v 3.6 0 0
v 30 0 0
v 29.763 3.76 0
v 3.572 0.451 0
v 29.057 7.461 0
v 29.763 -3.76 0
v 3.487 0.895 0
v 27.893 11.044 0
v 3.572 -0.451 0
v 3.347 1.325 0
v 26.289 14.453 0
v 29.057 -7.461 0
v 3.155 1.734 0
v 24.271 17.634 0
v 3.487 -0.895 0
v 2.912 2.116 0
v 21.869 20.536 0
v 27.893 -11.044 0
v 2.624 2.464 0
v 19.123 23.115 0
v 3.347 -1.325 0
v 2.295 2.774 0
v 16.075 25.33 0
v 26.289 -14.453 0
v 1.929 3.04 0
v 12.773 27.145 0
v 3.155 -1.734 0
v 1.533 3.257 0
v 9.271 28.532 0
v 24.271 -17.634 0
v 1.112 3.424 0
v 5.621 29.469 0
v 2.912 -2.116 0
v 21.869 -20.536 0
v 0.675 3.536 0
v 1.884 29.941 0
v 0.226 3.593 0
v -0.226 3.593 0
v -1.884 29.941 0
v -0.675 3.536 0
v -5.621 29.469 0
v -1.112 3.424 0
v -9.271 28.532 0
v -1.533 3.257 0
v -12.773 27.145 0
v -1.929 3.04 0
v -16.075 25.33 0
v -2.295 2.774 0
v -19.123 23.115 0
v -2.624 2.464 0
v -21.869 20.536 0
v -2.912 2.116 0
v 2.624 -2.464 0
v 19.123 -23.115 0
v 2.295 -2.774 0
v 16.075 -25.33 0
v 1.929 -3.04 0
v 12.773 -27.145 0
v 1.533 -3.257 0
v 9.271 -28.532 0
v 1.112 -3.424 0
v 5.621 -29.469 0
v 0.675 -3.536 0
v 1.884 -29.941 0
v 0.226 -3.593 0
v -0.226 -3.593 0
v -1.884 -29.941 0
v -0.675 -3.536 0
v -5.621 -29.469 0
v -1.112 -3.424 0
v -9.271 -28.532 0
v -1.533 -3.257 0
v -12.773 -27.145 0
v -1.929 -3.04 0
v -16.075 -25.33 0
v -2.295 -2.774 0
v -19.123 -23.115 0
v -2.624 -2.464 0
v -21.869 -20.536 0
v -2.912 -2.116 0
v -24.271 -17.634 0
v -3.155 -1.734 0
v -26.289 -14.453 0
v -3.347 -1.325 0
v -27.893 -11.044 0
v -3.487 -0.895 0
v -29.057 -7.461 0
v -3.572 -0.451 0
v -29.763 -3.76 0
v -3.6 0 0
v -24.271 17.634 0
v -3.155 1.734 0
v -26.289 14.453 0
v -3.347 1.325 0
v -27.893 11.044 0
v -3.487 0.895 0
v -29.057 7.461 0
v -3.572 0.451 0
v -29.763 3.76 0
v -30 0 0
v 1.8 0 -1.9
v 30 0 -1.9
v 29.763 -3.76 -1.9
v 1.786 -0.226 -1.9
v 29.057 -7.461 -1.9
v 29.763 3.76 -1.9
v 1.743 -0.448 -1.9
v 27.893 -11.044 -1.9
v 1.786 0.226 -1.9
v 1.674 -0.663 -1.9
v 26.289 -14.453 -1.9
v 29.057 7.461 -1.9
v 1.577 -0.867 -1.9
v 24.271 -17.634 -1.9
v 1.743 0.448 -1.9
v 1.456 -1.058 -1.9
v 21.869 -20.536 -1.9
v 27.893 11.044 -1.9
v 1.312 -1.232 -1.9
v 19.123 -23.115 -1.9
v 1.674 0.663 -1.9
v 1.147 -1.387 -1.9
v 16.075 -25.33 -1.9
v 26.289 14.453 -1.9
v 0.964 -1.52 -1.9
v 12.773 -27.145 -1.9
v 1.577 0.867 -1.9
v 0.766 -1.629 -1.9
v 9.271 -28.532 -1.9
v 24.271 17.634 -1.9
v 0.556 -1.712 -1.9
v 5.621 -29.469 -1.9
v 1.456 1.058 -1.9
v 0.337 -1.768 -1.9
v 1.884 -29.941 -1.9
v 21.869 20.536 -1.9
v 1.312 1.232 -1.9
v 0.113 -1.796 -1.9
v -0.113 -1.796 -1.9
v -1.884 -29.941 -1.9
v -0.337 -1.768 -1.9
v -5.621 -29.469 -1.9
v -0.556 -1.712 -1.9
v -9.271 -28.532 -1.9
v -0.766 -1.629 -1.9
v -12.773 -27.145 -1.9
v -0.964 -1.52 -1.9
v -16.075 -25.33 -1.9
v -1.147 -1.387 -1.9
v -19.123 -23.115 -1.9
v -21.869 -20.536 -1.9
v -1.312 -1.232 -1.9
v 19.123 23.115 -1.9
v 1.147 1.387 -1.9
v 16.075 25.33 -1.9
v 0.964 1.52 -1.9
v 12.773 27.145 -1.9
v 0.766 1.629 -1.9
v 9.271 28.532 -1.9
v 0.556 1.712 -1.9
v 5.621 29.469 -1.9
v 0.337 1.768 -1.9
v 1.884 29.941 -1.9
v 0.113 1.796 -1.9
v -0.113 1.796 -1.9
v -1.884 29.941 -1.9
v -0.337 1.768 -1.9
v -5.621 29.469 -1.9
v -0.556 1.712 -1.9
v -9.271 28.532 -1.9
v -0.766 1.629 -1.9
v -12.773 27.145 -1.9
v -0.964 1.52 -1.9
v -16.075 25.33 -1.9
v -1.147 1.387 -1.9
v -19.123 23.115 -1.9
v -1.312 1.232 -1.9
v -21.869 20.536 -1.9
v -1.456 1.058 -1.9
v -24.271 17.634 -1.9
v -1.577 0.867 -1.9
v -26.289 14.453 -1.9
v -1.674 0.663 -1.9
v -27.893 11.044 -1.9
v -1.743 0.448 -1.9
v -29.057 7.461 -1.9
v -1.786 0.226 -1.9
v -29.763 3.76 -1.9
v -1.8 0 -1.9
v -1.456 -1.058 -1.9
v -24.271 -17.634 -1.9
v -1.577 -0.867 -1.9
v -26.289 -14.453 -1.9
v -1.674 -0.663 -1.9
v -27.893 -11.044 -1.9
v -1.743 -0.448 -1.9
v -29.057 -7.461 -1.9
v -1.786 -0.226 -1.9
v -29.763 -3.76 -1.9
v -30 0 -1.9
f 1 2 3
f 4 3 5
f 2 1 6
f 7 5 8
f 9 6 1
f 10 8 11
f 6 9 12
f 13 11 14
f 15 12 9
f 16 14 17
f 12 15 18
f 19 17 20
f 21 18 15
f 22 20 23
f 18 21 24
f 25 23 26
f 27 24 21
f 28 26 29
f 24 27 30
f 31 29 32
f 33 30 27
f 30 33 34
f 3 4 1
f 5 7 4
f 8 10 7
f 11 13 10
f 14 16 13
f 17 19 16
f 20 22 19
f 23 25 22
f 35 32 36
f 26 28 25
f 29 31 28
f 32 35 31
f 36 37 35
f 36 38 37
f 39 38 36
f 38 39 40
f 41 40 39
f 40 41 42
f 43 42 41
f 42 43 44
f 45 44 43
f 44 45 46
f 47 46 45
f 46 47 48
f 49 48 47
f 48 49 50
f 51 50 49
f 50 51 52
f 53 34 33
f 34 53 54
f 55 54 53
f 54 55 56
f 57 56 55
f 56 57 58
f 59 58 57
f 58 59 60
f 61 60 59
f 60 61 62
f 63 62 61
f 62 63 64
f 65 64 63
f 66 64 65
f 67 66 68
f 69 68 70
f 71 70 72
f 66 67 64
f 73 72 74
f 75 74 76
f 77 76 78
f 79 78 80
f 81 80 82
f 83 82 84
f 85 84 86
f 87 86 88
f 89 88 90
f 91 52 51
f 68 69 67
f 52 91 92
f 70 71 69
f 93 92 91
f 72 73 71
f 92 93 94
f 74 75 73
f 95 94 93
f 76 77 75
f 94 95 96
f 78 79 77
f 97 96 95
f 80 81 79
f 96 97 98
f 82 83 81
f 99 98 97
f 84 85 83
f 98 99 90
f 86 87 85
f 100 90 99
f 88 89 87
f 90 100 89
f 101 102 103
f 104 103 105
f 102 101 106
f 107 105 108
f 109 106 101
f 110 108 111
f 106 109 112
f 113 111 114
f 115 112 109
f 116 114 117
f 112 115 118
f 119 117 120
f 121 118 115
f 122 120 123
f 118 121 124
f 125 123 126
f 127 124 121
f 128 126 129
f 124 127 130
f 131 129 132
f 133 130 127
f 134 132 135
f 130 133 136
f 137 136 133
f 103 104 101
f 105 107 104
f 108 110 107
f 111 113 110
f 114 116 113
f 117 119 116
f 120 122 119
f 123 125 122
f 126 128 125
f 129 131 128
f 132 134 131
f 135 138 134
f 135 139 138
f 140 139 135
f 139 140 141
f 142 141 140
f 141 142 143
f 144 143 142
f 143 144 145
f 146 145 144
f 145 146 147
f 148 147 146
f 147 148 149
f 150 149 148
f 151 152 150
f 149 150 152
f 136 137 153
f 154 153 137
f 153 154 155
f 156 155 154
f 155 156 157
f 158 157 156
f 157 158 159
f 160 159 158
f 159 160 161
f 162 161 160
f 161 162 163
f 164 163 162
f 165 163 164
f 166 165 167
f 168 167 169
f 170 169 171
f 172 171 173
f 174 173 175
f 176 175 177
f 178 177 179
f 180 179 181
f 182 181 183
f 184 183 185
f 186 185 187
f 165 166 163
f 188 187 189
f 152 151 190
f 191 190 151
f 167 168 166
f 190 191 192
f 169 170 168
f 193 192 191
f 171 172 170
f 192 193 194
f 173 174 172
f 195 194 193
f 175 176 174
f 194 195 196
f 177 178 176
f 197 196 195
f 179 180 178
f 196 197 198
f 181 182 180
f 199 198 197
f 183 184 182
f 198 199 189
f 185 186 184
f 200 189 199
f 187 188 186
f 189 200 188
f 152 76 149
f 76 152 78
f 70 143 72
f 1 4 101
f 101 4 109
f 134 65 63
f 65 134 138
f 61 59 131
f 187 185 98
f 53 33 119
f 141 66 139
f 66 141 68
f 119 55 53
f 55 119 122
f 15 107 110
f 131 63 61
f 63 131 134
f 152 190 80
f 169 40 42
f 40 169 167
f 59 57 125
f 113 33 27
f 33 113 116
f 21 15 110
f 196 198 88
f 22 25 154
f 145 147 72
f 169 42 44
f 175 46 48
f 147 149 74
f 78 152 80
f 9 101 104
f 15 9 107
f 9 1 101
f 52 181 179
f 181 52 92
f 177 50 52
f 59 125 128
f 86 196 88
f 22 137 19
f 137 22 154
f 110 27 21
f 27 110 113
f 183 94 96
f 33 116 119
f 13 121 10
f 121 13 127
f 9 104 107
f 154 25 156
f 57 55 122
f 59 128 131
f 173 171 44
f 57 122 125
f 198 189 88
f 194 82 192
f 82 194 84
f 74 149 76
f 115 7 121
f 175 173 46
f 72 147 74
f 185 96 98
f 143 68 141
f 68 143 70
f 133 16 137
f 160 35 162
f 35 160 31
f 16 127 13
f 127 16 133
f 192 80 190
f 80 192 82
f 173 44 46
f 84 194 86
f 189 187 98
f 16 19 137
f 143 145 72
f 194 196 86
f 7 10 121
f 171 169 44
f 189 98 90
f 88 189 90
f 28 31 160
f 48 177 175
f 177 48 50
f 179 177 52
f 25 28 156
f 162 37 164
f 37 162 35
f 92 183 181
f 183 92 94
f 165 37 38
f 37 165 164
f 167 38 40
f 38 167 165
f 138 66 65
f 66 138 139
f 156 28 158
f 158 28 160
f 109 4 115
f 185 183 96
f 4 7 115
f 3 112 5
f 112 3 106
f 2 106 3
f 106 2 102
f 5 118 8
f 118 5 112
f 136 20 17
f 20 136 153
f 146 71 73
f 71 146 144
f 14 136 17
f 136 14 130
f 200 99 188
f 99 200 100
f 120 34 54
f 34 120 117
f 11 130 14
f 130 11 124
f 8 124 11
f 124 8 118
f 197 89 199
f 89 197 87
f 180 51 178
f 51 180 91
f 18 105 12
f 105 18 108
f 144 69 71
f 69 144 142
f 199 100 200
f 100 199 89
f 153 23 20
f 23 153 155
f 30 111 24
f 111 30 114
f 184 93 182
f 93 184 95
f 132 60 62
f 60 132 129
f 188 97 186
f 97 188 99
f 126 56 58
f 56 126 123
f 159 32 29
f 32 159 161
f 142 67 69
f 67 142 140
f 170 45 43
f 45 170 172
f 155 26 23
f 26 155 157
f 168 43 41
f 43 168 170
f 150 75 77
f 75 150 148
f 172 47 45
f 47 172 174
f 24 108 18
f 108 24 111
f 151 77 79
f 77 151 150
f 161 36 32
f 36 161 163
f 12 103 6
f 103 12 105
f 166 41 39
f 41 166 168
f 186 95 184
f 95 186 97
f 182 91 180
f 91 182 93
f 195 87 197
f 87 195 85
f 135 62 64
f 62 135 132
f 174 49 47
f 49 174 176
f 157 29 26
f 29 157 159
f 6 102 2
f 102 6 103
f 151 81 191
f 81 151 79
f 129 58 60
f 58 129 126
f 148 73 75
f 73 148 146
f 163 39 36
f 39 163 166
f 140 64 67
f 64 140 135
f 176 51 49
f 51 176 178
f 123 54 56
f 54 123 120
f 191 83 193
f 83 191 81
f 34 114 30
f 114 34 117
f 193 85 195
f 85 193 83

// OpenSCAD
$fn = 50;


difference() {
	union() {
		translate(v = [0, 0, -1.9000000000]) {
			cylinder(h = 1.9000000000, r = 30.0000000000);
		}
	}
	union() {
		translate(v = [0, 0, 0]) {
			rotate(a = [0, 0, 0]) {
				difference() {
					union() {
						translate(v = [0, 0, -1.9000000000]) {
							cylinder(h = 1.9000000000, r = 1.5000000000);
						}
						translate(v = [0, 0, -1.9000000000]) {
							cylinder(h = 1.9000000000, r1 = 1.8000000000, r2 = 3.6000000000);
						}
						translate(v = [0, 0, -1.9000000000]) {
							cylinder(h = 1.9000000000, r = 1.8000000000);
						}
						translate(v = [0, 0, -1.9000000000]) {
							cylinder(h = 1.9000000000, r = 1.5000000000);
						}
					}
					union();
				}
			}
		}
	}
}
